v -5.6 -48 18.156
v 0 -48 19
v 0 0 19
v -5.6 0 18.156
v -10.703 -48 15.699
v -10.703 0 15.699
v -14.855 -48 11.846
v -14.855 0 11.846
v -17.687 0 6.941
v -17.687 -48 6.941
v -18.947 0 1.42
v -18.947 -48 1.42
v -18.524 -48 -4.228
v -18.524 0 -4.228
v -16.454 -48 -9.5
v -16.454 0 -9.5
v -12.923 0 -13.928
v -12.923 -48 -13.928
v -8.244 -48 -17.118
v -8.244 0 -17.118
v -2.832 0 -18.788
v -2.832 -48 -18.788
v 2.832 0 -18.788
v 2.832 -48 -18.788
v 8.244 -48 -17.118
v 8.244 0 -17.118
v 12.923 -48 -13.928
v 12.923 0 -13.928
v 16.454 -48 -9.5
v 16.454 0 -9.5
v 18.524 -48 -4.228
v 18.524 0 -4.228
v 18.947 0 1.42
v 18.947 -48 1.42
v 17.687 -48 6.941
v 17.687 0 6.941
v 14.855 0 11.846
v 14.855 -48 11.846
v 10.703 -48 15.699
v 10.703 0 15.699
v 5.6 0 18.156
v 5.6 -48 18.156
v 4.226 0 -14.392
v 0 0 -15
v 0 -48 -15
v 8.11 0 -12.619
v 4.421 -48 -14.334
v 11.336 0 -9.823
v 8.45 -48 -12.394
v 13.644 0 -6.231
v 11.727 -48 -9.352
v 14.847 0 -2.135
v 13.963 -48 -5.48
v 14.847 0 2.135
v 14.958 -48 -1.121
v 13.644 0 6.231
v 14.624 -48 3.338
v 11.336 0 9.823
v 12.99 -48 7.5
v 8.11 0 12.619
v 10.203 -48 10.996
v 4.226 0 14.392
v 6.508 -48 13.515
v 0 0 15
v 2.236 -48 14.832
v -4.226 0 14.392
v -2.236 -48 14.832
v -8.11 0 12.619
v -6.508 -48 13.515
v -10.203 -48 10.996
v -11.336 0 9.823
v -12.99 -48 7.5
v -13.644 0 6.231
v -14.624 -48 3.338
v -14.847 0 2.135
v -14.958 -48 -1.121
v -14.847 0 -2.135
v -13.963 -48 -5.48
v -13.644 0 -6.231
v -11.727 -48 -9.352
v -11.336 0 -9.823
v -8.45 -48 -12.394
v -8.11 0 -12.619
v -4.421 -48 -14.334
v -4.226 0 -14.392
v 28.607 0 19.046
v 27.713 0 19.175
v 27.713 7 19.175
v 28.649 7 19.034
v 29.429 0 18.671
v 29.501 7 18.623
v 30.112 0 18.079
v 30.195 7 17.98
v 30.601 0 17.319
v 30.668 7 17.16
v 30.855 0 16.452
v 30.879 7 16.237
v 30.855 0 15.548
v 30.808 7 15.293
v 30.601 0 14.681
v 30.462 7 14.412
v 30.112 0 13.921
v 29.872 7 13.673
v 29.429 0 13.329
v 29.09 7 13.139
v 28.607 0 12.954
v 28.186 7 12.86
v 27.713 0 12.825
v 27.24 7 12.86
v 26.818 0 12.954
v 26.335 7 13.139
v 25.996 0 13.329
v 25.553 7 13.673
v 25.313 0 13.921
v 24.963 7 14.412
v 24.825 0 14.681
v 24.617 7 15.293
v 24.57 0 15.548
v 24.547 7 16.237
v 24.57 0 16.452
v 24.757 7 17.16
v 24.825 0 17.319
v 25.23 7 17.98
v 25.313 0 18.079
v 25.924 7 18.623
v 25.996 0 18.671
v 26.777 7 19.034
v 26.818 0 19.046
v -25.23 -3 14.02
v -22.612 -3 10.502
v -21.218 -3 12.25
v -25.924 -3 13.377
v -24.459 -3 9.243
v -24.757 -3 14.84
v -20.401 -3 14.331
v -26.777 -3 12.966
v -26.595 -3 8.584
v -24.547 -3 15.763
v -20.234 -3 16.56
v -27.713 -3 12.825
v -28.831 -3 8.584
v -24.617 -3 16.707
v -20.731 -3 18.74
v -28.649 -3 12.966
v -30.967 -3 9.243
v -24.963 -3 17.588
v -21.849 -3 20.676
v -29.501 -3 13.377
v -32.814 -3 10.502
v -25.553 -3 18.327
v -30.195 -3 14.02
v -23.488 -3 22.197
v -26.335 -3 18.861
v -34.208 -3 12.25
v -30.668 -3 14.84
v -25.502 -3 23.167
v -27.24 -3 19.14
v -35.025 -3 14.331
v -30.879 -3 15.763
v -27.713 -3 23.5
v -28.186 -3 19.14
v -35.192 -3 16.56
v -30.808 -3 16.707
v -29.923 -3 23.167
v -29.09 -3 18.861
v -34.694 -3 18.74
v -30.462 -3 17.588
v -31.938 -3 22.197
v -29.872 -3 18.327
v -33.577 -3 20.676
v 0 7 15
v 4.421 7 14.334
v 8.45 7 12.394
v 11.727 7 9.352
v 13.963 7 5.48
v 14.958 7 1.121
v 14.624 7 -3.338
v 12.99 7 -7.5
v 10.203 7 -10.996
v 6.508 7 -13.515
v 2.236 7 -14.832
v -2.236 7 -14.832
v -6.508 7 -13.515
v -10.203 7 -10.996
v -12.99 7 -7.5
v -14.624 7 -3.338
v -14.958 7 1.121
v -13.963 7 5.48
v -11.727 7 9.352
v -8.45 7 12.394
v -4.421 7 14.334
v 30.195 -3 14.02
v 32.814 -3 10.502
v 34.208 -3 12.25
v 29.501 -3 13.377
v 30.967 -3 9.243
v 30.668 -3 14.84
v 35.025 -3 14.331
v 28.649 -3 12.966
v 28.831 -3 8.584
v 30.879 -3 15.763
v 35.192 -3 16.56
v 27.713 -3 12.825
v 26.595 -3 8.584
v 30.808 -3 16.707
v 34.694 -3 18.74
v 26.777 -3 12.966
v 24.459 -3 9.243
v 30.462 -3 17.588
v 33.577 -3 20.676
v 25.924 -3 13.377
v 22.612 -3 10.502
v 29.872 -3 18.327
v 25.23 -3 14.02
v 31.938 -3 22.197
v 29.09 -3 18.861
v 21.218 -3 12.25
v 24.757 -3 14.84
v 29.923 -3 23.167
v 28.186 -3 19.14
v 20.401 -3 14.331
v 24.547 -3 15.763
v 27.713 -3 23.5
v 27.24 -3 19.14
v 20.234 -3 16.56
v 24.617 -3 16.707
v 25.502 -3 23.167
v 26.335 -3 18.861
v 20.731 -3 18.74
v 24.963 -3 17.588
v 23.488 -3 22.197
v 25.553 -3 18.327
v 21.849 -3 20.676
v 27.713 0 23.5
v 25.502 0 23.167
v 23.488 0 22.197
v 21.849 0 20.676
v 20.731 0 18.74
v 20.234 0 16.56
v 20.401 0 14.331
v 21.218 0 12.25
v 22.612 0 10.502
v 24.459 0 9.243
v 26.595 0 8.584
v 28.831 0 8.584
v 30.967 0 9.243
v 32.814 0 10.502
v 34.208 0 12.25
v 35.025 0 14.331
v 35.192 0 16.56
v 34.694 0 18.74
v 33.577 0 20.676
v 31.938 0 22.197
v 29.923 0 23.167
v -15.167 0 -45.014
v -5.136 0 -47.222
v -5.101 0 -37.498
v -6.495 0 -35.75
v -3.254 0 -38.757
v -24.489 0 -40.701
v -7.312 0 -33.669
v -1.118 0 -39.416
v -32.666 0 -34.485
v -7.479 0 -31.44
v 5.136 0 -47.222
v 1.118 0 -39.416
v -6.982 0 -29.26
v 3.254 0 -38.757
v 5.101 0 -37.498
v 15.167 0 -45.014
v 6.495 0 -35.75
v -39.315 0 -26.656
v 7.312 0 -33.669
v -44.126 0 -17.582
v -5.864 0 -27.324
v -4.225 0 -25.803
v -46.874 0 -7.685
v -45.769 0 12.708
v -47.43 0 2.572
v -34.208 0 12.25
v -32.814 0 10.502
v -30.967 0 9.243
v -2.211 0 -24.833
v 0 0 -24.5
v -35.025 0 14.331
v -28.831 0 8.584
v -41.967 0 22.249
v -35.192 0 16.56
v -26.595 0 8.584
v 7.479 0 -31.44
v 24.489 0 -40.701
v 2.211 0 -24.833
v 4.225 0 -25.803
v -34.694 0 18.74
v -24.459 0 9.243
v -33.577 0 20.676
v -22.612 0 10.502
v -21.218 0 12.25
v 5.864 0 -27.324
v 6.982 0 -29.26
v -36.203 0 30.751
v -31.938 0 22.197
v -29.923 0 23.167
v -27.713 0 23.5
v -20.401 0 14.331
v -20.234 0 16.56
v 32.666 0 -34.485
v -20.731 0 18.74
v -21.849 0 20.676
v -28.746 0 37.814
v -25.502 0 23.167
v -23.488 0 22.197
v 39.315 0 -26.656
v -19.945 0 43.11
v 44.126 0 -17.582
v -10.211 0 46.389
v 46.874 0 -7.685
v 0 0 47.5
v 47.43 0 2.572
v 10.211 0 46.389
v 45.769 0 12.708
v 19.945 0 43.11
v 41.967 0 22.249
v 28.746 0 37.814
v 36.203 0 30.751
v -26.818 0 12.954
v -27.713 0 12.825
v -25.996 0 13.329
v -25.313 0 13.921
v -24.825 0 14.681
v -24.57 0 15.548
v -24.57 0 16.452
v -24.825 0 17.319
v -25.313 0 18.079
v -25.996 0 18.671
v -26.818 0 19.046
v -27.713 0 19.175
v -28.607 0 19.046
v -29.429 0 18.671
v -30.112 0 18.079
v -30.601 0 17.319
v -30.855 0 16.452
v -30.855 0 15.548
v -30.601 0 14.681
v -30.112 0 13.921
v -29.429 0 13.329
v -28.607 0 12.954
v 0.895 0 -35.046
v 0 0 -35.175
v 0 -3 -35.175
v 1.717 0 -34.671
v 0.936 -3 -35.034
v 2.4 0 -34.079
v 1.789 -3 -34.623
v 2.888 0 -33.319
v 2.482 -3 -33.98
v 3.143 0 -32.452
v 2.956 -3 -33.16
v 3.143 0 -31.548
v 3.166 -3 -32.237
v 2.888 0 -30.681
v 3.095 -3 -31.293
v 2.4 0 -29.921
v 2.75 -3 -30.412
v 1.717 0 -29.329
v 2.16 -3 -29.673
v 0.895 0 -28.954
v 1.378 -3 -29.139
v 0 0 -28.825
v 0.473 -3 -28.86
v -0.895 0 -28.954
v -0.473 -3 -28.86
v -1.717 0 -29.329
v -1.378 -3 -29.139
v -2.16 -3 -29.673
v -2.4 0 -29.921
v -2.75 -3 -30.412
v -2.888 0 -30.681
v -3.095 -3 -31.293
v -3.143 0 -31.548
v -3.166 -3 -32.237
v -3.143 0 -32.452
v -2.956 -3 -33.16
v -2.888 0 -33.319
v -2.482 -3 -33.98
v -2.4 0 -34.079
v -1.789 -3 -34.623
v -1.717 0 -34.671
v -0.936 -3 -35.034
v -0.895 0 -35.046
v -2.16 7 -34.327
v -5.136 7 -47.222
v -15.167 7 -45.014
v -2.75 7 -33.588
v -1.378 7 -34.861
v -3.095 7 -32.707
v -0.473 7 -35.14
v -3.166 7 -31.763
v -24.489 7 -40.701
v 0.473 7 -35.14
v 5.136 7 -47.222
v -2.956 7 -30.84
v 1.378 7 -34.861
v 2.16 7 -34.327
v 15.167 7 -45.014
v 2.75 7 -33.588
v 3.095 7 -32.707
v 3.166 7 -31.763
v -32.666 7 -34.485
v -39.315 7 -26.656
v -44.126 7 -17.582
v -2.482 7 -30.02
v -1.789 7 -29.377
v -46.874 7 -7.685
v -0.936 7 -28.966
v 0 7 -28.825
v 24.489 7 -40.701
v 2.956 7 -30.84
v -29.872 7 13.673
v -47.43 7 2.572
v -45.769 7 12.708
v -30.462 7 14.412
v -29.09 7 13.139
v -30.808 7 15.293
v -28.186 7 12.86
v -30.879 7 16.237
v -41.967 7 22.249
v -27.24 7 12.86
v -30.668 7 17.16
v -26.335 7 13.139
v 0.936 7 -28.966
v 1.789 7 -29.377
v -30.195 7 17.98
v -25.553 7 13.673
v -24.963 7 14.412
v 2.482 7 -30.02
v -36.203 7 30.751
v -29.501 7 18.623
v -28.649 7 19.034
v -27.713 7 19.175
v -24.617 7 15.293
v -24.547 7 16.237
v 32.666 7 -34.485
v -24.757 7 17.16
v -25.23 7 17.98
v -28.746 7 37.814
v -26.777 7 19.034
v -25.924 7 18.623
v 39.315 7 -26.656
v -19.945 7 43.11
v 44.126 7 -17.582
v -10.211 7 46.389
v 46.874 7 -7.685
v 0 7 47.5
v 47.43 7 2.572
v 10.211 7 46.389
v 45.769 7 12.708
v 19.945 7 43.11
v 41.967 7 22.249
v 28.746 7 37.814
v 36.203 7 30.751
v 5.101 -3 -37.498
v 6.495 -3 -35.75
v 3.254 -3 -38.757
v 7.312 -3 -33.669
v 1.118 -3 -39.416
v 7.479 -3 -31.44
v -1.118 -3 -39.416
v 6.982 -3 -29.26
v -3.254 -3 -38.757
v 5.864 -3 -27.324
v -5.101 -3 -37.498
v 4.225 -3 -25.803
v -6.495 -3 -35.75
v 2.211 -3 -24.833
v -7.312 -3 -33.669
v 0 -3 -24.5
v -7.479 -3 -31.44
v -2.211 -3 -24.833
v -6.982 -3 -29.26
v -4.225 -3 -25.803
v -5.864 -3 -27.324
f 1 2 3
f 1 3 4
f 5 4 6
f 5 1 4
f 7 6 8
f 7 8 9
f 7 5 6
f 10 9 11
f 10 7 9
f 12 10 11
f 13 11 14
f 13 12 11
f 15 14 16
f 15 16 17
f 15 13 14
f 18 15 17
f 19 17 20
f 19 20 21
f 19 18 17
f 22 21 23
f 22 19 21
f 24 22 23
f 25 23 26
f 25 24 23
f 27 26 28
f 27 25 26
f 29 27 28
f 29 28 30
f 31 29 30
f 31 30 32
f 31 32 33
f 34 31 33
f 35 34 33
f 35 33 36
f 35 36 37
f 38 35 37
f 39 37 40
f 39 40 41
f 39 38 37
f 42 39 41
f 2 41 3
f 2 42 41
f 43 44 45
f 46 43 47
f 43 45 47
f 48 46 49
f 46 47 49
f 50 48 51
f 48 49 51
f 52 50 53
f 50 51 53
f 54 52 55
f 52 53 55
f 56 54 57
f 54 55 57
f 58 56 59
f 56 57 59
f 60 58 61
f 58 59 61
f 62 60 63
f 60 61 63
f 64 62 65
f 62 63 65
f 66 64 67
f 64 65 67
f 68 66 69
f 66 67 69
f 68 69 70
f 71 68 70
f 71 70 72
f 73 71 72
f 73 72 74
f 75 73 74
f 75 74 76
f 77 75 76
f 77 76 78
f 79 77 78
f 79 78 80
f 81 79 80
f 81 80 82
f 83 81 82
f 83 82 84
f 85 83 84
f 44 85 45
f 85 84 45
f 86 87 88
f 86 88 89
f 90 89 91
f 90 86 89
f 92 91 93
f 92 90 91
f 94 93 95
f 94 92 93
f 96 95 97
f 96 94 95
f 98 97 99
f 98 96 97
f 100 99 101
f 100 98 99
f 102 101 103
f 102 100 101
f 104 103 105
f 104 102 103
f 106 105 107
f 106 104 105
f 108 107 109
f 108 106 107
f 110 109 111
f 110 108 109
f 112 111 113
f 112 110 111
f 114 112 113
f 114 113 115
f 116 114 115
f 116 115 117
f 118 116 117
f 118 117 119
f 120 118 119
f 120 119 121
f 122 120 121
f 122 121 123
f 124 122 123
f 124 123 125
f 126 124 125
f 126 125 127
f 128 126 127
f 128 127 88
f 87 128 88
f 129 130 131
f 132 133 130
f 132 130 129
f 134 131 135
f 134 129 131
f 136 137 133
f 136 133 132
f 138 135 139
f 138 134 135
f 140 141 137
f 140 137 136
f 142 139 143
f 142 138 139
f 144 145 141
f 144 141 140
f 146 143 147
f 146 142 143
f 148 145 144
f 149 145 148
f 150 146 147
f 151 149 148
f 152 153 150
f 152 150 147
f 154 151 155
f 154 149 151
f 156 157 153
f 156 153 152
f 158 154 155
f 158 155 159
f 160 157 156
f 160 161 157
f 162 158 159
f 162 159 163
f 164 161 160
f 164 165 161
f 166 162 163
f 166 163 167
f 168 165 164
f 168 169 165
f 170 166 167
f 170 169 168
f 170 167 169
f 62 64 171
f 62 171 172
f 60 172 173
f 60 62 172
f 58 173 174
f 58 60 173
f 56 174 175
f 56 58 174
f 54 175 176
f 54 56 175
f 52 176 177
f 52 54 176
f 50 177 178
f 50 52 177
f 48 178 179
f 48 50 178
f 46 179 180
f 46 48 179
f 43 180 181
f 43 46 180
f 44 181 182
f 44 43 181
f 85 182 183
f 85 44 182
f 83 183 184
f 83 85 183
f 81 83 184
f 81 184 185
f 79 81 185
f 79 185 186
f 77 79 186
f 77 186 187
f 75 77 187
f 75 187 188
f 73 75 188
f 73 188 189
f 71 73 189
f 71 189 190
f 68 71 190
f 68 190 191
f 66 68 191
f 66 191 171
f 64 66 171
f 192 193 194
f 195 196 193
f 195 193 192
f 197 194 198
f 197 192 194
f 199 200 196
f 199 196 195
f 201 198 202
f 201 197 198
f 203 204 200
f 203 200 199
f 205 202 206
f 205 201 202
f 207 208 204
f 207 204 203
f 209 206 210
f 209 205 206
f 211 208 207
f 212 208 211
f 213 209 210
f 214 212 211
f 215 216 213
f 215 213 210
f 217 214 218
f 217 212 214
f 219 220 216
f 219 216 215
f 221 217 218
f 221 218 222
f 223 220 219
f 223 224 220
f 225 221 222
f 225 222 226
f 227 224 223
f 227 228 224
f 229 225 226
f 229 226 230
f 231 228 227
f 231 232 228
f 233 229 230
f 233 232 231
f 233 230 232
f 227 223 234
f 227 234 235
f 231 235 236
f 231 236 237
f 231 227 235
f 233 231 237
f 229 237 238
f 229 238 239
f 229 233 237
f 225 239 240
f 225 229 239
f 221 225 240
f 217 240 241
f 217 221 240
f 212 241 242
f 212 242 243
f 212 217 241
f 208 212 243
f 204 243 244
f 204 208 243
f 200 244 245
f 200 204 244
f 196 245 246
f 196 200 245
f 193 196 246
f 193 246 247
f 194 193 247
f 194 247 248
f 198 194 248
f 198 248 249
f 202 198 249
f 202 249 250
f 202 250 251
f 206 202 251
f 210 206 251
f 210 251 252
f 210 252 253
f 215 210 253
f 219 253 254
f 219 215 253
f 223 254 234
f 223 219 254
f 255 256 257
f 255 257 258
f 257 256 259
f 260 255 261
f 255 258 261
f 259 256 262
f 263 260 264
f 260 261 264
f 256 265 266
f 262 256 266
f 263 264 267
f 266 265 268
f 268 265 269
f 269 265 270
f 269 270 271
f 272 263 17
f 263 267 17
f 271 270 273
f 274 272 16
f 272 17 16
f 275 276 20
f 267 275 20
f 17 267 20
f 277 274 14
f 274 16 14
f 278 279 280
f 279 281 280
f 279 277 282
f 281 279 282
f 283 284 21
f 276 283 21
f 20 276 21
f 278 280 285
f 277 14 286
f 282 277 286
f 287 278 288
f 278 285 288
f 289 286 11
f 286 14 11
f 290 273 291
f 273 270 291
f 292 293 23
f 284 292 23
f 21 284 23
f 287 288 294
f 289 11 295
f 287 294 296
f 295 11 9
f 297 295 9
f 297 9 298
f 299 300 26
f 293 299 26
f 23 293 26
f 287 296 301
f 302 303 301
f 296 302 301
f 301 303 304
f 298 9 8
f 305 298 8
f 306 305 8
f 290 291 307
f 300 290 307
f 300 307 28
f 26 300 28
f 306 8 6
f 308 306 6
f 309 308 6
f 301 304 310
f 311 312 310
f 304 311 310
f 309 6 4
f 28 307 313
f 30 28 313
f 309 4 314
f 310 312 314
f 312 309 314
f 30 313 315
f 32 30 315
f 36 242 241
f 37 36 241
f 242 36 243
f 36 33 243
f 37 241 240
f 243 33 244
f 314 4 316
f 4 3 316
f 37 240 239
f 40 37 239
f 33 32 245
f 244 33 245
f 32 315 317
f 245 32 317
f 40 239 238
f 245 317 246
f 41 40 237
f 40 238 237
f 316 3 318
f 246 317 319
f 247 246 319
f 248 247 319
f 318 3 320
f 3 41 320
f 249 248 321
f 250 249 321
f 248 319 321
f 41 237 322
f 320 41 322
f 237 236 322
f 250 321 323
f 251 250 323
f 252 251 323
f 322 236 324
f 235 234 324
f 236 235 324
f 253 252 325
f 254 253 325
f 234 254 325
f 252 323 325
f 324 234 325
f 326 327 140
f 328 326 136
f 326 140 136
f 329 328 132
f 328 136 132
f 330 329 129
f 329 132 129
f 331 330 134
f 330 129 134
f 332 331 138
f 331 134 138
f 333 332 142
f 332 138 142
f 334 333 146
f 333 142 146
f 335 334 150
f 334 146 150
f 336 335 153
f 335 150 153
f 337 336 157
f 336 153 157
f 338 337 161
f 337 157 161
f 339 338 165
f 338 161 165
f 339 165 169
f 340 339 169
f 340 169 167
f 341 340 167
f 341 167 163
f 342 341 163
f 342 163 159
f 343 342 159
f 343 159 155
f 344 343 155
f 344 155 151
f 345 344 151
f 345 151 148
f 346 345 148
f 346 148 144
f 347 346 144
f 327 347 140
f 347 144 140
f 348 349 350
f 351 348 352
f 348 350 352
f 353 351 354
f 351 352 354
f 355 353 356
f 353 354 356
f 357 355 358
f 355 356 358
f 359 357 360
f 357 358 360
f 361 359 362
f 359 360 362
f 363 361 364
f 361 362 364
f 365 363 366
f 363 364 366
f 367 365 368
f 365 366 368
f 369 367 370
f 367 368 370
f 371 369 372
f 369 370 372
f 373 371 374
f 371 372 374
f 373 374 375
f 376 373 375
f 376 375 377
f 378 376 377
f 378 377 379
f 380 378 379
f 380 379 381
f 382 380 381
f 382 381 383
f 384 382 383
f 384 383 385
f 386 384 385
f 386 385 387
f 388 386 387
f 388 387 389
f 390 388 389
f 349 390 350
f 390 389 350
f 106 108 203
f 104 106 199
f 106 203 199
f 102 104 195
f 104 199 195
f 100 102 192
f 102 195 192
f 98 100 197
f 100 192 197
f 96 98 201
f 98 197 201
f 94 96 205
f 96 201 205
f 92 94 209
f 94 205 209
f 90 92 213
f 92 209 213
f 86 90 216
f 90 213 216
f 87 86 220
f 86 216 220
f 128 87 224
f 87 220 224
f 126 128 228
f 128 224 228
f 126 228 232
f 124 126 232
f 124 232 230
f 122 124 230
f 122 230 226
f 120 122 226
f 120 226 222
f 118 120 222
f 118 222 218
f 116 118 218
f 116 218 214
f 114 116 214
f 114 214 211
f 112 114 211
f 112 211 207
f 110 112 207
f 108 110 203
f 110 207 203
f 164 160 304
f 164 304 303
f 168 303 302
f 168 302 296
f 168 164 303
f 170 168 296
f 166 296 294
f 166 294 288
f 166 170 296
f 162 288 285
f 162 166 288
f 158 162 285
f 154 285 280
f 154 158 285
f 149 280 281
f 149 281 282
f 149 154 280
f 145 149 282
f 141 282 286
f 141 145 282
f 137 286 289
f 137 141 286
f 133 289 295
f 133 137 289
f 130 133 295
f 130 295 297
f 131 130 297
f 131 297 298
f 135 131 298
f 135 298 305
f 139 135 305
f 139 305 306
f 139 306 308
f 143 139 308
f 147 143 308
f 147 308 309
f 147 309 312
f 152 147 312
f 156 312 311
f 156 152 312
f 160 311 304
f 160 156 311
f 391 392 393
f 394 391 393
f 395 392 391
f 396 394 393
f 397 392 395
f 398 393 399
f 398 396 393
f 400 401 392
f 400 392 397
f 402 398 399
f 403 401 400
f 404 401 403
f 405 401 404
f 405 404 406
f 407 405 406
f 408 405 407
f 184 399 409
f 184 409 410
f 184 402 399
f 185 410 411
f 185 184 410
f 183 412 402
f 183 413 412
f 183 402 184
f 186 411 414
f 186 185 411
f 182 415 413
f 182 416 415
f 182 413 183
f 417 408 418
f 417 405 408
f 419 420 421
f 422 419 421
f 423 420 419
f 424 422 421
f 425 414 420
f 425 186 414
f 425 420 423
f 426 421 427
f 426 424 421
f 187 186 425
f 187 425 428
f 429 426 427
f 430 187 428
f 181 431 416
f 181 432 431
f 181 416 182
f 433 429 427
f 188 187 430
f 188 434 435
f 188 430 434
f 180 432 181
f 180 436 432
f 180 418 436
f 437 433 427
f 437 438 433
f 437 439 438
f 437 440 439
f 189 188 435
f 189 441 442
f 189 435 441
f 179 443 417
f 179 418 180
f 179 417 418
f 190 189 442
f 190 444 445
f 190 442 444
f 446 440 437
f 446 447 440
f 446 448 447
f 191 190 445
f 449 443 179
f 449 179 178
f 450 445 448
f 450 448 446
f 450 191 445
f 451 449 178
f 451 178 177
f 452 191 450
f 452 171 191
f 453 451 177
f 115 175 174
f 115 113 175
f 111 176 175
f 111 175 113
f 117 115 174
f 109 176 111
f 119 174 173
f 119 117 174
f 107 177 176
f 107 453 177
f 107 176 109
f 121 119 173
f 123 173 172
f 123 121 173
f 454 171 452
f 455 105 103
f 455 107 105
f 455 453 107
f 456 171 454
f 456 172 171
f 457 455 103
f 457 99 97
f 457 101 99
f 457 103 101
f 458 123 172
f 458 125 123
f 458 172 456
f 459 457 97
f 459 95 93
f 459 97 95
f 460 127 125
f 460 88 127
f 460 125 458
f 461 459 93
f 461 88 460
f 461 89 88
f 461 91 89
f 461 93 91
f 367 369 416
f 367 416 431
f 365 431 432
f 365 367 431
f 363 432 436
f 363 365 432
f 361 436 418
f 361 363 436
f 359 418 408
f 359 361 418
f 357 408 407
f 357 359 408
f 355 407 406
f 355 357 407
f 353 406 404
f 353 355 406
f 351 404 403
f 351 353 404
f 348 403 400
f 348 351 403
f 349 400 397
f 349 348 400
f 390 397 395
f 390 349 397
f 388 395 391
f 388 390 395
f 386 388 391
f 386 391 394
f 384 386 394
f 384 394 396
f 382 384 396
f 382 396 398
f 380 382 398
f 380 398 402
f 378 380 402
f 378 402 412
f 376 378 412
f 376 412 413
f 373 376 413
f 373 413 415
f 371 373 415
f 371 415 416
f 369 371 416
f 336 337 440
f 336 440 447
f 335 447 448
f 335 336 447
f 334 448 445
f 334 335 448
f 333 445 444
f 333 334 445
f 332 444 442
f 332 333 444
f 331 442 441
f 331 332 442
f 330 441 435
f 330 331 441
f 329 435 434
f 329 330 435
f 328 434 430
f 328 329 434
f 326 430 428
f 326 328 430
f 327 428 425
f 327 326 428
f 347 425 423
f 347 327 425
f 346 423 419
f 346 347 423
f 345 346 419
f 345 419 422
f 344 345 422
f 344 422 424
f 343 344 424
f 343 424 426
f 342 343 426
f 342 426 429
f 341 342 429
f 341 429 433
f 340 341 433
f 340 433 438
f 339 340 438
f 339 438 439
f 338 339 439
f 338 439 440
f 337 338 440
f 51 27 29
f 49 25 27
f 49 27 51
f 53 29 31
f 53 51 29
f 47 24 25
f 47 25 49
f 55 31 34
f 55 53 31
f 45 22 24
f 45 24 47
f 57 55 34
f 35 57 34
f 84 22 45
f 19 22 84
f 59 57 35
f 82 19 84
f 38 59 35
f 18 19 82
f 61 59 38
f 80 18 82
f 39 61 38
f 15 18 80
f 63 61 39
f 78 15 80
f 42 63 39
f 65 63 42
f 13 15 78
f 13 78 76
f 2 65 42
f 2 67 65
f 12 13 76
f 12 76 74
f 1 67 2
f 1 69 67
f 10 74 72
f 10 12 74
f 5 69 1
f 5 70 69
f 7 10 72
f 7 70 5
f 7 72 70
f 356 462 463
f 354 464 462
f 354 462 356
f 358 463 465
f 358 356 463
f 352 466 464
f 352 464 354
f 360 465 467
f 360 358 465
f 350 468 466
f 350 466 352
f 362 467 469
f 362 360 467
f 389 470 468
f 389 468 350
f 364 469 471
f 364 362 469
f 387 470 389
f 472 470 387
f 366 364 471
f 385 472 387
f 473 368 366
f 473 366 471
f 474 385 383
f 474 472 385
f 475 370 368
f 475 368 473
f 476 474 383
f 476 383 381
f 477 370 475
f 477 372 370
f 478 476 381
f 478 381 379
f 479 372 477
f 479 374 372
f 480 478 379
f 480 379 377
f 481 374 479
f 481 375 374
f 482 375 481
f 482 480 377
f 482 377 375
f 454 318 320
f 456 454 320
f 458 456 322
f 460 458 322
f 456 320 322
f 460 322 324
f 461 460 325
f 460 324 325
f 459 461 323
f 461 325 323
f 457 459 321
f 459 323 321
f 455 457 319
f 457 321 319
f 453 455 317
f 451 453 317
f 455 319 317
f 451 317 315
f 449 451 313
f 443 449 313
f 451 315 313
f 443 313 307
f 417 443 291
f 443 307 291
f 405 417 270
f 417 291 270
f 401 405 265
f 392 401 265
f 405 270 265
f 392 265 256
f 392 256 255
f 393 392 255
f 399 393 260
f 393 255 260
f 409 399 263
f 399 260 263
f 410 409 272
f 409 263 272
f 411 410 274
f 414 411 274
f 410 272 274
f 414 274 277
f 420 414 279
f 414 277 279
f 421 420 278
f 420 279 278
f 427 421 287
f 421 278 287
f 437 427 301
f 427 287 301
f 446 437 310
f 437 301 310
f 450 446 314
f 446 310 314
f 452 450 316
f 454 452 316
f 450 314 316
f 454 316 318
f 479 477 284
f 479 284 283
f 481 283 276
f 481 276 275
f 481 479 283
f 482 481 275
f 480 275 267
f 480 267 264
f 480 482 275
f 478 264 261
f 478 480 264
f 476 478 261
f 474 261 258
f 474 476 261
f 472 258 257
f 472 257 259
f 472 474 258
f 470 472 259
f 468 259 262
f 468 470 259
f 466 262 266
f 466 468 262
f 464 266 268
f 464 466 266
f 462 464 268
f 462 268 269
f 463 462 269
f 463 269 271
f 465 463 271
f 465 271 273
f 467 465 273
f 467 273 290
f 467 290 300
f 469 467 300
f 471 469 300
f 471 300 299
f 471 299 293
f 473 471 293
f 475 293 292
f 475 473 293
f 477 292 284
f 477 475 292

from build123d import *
from build123d.topology import SkipClean

# Parameters (mm, degrees)
CROQUIS1_R              = 47.5
CROQUIS1_R_2            = 3.175
CROQUIS1_R_3            = 15
SALIENTE_EXTRUIR1_DEPTH = 7
SALIENTE_EXTRUIR2_START = 48
CROQUIS2_R              = 19
CROQUIS2_R_2            = 15
SALIENTE_EXTRUIR2_DEPTH = 48
SALIENTE_EXTRUIR3_START = 3
CROQUIS3_R              = 7.5
CROQUIS3_R_2            = 3.175
SALIENTE_EXTRUIR3_DEPTH = 3


with BuildPart() as part:
    # Croquis1 → Saliente-Extruir1 (new body)
    with BuildSketch(Plane(origin=(0, 0, 0), x_dir=(1, 0, 0), z_dir=(0, 1, 0))):
        with Locations(Location((0, 0, 0), (0, 0, 270))):
            Circle(CROQUIS1_R)
        with Locations(Location((0, 32, 0), (0, 0, 270))):
            Circle(CROQUIS1_R_2, mode=Mode.SUBTRACT)
        with Locations(Location((27.712812921, -16, 0), (0, 0, 270))):
            Circle(CROQUIS1_R_2, mode=Mode.SUBTRACT)
        with Locations(Location((-27.712812921, -16, 0), (0, 0, 270))):
            Circle(CROQUIS1_R_2, mode=Mode.SUBTRACT)
        with Locations(Location((0, 0, 0), (0, 0, 270))):
            Circle(CROQUIS1_R_3, mode=Mode.SUBTRACT)
    extrude(amount=SALIENTE_EXTRUIR1_DEPTH)

    # Croquis2 → Saliente-Extruir2 (add)
    with SkipClean():  # the faces are left unmerged after this step: merging them gives an invalid solid
        with BuildSketch(Plane.XZ.offset(SALIENTE_EXTRUIR2_START)):
            with Locations(Location((0, 0, 0), (0, 0, 90))):
                Circle(CROQUIS2_R)
            with Locations(Location((0, 0, 0), (0, 0, 270))):
                Circle(CROQUIS2_R_2, mode=Mode.SUBTRACT)
        extrude(amount=-SALIENTE_EXTRUIR2_DEPTH)

    # Croquis3 → Saliente-Extruir3 (add)
    # profile 1 of 3: a face of its own
    with SkipClean():  # the faces are left unmerged after this step: merging them gives an invalid solid
        with BuildSketch(Plane.XZ.offset(SALIENTE_EXTRUIR3_START)):
            with Locations(Location((-27.712812921, 16, 0), (0, 0, 90))):
                Circle(CROQUIS3_R)
            with Locations(Location((-27.712812921, 16, 0), (0, 0, 270))):
                Circle(CROQUIS3_R_2, mode=Mode.SUBTRACT)
        # profile 2 of 3: a face of its own
        with BuildSketch(Plane.XZ.offset(SALIENTE_EXTRUIR3_START)):
            with Locations(Location((27.712812921, 16, 0), (0, 0, 90))):
                Circle(CROQUIS3_R)
            with Locations(Location((27.712812921, 16, 0), (0, 0, 270))):
                Circle(CROQUIS3_R_2, mode=Mode.SUBTRACT)
        # profile 3 of 3: a face of its own
        with BuildSketch(Plane.XZ.offset(SALIENTE_EXTRUIR3_START)):
            with Locations(Location((0, -32, 0), (0, 0, 90))):
                Circle(CROQUIS3_R)
            with Locations(Location((0, -32, 0), (0, 0, 270))):
                Circle(CROQUIS3_R_2, mode=Mode.SUBTRACT)
        extrude(amount=-SALIENTE_EXTRUIR3_DEPTH)


solid = part.part
